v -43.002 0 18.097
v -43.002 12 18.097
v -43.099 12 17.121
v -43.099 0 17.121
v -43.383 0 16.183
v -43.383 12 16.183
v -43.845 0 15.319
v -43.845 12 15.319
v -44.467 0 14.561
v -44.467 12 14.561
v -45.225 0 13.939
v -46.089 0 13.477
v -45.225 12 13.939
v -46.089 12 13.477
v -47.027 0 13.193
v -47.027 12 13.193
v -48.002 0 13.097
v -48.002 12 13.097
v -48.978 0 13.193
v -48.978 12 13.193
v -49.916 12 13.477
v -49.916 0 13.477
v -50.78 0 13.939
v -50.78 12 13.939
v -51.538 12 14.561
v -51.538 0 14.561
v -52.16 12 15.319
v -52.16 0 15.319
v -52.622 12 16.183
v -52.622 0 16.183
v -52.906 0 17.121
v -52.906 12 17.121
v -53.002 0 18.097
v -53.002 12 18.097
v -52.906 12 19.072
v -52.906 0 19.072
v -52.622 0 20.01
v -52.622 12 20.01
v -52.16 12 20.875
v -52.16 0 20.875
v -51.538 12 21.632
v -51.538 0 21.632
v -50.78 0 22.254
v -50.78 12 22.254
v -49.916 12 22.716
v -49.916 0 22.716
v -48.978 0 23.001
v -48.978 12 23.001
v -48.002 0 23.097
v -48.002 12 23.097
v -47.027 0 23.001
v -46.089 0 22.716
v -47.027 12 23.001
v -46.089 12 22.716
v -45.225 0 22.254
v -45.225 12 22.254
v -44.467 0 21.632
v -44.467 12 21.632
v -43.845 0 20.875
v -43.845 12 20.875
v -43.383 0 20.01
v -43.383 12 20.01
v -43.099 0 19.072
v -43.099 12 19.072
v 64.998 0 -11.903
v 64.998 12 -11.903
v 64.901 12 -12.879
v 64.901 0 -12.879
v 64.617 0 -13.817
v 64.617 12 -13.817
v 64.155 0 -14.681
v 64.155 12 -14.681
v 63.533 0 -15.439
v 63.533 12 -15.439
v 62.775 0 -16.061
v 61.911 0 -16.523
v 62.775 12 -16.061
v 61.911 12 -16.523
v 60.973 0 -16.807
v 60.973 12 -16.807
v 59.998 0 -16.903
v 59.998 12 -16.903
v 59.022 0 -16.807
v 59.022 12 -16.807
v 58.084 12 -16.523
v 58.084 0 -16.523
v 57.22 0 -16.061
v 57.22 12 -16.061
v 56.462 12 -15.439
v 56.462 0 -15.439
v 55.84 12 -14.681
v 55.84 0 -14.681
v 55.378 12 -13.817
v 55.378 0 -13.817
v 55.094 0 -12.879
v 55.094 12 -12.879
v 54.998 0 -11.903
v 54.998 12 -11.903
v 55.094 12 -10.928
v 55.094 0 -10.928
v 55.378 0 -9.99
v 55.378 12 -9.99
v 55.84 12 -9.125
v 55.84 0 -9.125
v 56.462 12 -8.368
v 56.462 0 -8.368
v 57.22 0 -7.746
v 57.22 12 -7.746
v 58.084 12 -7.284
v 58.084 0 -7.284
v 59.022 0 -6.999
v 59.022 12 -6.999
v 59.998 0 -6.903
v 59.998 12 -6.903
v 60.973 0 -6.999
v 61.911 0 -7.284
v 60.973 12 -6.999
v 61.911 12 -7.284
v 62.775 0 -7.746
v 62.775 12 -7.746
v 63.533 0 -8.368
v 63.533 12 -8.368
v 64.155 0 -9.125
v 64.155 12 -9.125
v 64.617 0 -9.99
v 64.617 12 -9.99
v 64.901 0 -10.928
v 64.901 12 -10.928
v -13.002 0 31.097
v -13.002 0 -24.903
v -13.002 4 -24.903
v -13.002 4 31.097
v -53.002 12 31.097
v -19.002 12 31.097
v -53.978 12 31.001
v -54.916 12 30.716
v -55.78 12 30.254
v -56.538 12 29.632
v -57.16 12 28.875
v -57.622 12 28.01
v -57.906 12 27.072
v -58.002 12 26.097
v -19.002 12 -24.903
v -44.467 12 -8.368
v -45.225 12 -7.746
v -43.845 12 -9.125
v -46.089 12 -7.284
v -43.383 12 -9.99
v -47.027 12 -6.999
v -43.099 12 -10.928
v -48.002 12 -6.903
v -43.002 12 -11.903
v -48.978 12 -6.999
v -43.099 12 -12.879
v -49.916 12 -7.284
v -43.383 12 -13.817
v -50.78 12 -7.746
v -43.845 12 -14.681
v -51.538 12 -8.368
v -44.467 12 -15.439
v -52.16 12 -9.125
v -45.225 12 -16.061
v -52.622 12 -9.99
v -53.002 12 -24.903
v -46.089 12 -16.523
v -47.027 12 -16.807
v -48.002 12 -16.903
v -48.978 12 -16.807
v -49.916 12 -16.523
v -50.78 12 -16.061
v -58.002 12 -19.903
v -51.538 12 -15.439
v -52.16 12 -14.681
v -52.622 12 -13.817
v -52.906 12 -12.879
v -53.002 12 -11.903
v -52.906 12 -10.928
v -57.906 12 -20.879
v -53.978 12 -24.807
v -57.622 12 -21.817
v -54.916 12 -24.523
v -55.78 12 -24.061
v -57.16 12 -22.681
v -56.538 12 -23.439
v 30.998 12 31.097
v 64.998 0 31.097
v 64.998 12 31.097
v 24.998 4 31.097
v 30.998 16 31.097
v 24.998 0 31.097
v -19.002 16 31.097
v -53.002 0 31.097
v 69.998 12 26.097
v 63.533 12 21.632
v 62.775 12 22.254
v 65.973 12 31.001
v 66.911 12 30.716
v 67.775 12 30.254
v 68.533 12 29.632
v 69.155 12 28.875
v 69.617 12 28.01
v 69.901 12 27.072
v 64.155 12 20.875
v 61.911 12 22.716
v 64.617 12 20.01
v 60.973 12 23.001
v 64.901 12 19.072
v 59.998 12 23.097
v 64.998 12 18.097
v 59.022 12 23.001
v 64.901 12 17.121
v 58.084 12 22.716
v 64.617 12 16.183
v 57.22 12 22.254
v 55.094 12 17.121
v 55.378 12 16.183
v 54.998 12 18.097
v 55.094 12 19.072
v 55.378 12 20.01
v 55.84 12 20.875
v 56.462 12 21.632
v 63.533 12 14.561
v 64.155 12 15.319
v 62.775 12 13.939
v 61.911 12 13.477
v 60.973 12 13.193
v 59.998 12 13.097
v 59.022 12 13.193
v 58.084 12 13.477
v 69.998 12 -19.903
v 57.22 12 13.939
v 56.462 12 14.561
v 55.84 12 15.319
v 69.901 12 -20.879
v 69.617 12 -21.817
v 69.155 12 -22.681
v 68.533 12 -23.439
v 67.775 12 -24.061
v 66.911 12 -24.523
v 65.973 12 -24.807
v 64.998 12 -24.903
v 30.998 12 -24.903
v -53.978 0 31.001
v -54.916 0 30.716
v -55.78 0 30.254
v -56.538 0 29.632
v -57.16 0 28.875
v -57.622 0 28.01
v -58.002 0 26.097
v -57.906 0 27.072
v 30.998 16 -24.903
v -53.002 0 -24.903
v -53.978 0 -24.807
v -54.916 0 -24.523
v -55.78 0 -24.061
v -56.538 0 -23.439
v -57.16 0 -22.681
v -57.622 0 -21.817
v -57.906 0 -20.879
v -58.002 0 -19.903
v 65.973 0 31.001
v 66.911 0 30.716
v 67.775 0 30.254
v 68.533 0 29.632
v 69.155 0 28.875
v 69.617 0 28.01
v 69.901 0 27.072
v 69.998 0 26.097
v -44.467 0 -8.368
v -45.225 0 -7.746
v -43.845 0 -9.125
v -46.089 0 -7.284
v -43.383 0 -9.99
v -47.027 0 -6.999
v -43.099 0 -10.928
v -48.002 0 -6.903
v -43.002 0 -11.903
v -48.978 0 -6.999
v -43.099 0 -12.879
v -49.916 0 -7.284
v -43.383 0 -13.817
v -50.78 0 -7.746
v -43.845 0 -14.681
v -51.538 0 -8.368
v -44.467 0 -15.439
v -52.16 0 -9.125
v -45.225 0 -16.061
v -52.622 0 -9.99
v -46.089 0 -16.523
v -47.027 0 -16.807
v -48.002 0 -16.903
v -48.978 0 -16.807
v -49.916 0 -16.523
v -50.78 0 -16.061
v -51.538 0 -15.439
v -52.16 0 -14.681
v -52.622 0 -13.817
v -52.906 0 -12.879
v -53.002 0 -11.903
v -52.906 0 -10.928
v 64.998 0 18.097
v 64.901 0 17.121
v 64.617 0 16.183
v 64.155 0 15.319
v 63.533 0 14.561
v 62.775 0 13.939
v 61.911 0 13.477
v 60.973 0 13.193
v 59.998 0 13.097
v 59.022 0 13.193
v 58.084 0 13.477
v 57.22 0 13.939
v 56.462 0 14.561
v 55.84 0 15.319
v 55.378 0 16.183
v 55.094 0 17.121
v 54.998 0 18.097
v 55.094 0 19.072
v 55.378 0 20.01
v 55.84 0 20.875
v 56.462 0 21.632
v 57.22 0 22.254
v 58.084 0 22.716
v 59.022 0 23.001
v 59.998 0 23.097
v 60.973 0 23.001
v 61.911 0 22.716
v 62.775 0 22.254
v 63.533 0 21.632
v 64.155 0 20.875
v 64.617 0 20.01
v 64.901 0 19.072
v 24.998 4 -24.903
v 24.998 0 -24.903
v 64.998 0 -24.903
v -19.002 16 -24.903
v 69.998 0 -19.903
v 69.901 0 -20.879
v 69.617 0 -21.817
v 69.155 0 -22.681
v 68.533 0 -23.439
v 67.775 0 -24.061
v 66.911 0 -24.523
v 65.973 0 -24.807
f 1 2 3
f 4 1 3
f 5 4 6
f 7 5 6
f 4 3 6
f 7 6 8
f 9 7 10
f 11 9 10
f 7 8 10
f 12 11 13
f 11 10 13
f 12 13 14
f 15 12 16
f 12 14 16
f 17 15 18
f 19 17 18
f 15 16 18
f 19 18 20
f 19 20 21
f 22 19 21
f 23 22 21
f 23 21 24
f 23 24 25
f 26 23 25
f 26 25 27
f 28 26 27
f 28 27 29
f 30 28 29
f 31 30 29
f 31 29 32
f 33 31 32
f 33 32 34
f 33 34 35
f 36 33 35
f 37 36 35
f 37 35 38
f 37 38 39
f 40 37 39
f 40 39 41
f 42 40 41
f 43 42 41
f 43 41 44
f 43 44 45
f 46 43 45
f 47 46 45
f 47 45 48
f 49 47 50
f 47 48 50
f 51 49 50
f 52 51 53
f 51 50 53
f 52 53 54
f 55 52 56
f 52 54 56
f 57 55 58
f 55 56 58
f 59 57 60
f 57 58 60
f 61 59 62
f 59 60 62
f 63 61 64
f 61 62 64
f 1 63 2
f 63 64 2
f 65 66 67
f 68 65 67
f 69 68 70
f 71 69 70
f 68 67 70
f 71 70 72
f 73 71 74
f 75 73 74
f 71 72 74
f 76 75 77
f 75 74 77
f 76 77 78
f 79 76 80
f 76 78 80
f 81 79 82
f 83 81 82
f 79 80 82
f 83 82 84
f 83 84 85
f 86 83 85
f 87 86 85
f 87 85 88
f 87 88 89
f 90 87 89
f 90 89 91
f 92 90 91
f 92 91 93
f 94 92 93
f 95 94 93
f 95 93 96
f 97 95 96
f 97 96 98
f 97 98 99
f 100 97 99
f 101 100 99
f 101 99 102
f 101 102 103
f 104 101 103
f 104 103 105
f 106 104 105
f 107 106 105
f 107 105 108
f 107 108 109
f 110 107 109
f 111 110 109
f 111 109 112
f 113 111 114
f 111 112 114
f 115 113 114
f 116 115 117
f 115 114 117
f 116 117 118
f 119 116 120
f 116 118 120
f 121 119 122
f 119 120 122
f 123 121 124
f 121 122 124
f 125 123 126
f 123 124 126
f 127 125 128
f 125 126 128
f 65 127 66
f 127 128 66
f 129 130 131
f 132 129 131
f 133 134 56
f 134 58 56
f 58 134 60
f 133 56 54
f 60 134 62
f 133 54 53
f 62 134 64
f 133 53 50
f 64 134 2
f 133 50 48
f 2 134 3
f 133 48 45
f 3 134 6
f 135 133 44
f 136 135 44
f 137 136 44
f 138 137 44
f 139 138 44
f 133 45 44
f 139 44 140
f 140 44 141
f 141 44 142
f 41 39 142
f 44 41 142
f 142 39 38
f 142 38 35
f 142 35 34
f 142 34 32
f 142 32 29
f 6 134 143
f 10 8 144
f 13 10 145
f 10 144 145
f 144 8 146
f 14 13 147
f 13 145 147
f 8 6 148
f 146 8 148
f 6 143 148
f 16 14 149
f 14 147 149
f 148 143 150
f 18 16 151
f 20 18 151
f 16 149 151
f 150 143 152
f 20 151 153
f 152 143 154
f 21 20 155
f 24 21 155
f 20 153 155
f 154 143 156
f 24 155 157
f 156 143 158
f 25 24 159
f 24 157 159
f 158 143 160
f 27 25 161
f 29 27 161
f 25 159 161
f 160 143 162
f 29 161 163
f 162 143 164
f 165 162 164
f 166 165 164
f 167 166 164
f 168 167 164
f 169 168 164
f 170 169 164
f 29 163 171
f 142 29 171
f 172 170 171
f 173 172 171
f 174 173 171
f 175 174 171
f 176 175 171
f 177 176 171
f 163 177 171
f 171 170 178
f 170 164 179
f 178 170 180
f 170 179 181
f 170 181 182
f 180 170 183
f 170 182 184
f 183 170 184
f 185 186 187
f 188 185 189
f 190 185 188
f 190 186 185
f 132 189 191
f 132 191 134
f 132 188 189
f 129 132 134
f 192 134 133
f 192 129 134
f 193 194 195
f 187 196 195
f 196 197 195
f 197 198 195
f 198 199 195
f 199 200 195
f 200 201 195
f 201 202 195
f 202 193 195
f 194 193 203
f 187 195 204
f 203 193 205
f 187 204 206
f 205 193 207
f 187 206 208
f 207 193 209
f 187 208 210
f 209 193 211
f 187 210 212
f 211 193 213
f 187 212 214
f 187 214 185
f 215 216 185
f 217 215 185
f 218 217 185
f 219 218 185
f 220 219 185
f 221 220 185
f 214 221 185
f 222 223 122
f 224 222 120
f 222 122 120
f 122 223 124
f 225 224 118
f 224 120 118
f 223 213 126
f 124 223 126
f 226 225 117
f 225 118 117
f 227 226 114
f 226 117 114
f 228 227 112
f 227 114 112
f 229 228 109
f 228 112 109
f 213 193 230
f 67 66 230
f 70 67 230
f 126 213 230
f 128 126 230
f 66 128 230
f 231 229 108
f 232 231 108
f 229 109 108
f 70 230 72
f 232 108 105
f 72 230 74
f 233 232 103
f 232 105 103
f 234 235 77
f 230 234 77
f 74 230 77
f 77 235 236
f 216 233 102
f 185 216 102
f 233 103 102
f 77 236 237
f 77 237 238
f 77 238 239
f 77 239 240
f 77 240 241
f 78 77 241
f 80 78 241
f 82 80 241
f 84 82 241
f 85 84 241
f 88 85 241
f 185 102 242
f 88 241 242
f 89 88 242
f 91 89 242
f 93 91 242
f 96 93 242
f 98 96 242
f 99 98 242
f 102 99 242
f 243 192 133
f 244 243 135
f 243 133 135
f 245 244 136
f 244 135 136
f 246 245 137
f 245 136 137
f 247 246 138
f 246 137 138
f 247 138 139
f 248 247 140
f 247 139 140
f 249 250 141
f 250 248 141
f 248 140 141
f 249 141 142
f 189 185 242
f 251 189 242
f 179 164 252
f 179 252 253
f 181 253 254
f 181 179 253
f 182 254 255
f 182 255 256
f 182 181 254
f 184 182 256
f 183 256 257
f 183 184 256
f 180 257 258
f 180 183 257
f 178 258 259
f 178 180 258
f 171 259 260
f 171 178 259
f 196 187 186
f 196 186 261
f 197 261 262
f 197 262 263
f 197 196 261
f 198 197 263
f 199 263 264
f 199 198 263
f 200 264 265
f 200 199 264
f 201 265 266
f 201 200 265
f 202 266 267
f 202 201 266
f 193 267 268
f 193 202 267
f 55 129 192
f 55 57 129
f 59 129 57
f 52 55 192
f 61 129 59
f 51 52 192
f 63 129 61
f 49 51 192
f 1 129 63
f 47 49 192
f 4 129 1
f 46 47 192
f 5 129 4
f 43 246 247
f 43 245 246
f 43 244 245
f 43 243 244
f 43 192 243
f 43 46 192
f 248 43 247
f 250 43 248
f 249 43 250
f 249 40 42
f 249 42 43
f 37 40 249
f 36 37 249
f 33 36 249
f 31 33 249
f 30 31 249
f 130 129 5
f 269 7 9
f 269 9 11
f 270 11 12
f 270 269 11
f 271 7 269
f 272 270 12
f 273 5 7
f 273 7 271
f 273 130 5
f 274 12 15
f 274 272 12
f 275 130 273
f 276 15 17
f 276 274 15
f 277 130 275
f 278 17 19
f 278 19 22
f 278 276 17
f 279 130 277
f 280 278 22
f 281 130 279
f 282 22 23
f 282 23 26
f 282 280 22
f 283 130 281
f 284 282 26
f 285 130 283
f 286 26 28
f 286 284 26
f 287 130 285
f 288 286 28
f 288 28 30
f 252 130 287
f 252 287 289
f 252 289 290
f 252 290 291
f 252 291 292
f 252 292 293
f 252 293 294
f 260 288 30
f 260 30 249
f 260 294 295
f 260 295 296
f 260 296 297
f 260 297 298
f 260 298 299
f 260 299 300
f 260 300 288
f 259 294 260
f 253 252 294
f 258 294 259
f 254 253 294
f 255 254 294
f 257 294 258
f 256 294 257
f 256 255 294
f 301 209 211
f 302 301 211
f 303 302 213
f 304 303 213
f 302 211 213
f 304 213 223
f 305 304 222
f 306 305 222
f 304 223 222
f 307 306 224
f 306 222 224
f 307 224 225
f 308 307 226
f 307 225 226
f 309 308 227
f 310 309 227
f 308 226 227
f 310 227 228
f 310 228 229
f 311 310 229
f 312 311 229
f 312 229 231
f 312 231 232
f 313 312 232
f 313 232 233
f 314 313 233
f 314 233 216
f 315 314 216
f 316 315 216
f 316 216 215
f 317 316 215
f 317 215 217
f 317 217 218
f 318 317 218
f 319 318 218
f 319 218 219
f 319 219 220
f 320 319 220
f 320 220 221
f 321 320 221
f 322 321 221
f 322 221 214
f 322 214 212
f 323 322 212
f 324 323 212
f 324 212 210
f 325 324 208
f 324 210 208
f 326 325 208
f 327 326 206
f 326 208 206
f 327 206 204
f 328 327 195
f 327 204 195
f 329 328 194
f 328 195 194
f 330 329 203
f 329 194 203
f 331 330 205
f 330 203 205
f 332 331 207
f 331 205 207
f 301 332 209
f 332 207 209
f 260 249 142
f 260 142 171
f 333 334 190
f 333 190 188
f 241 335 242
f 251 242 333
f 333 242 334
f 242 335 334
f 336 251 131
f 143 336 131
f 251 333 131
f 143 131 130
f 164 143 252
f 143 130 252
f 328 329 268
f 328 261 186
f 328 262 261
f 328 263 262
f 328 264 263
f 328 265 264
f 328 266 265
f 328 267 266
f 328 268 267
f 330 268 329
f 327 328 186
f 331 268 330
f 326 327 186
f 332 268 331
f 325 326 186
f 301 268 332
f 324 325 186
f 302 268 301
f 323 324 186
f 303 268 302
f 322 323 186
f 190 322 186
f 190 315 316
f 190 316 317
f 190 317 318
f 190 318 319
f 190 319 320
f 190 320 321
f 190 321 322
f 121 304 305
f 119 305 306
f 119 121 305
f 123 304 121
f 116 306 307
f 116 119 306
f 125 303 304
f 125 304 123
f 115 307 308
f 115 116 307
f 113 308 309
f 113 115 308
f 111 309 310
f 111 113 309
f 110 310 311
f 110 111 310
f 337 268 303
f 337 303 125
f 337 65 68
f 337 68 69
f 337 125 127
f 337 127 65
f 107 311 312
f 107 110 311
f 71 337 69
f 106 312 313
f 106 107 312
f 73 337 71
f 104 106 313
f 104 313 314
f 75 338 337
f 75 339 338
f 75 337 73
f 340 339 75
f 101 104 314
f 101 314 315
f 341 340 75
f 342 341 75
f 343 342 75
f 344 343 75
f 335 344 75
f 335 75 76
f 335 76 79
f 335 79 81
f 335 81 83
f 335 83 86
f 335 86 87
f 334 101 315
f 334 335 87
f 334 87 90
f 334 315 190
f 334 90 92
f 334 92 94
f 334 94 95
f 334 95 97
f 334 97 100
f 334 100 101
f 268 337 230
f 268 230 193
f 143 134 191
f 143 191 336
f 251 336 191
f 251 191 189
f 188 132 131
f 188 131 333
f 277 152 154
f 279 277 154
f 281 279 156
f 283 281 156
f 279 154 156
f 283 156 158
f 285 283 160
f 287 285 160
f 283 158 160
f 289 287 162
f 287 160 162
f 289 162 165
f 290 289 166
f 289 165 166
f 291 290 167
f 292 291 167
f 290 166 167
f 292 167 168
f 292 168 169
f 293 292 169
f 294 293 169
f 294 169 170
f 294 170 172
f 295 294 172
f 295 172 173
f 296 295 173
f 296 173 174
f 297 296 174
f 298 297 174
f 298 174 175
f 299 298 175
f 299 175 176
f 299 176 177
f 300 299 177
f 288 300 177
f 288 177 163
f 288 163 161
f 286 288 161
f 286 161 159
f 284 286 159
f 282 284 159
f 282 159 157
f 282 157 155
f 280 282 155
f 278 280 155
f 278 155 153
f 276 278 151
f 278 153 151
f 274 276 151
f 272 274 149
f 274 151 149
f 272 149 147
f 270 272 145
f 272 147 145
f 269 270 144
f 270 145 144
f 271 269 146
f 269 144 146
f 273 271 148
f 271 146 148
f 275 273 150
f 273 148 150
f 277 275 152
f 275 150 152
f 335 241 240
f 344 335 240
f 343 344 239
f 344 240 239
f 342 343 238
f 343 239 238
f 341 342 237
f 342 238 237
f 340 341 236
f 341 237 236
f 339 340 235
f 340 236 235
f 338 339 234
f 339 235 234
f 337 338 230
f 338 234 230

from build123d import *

# Parameters (mm, degrees)
Y_KSEKLIK_EKSTR_ZYON1_DEPTH = 12
IZIM2_W                     = 50
IZIM2_H                     = 56
Y_KSEKLIK_EKSTR_ZYON2_DEPTH = 4
IZIM3_W                     = 38
IZIM3_H                     = 4
KES_EKSTR_ZYON1_DEPTH       = 56
IZIM4_R                     = 5
KES_EKSTR_ZYON2_DEPTH       = 56
KES_EKSTR_ZYON3_DEPTH       = 56


with BuildPart() as part:
    # Çizim1 → Yükseklik-Ekstrüzyon1 (new body)
    with BuildSketch(Plane(origin=(0, 0, 0), x_dir=(1, 0, 0), z_dir=(0, 1, 0))):
        Polygon((69.99751861, 24.903225806), (69.99751861, -31.096774194), (-58.00248139, -31.096774194), (-58.00248139, 24.903225806), (-19.00248139, 24.903225806), (30.99751861, 24.903225806), align=None)
    extrude(amount=Y_KSEKLIK_EKSTR_ZYON1_DEPTH)

    # Çizim2 → Yükseklik-Ekstrüzyon2 (add)
    with BuildSketch(Plane(origin=(0, 12, 0), x_dir=(1, 0, 0), z_dir=(0, 1, 0))):
        with Locations((5.99751861, -3.096774194)):
            Rectangle(IZIM2_W, IZIM2_H)
    extrude(amount=Y_KSEKLIK_EKSTR_ZYON2_DEPTH)

    # Çizim3 → Kes-Ekstrüzyon1 (cut)
    with BuildSketch(Plane.XY.offset(31.096774194)):
        with Locations((5.99751861, 2)):
            Rectangle(IZIM3_W, IZIM3_H)
    extrude(amount=-KES_EKSTR_ZYON1_DEPTH, mode=Mode.SUBTRACT)

    # Çizim4 → Kes-Ekstrüzyon2 (cut)
    with BuildSketch(Plane(origin=(0, 12, 0), x_dir=(1, 0, 0), z_dir=(0, 1, 0))):
        with Locations((-48.00248139, 11.903225806)):
            Circle(IZIM4_R)
        with Locations((-48.00248139, -18.096774194)):
            Circle(IZIM4_R)
        with Locations((59.99751861, -18.096774194)):
            Circle(IZIM4_R)
        with Locations((59.99751861, 11.903225806)):
            Circle(IZIM4_R)
    extrude(amount=-KES_EKSTR_ZYON2_DEPTH, mode=Mode.SUBTRACT)

    # Çizim5 → Kes-Ekstrüzyon3 (cut)
    with BuildSketch(Plane(origin=(0, 12, 0), x_dir=(1, 0, 0), z_dir=(0, 1, 0))):
        with BuildLine():
            Line((-58.00248139, 19.903225806), (-58.00248139, 24.903225806))
            Line((-58.00248139, 24.903225806), (-53.00248139, 24.903225806))
            ThreePointArc((-53.00248139, 24.903225806), (-56.538015296, 23.438759712), (-58.00248139, 19.903225806))
        make_face()
        with BuildLine():
            Line((69.99751861, -26.096774194), (69.99751861, -31.096774194))
            Line((69.99751861, -31.096774194), (64.99751861, -31.096774194))
            ThreePointArc((64.99751861, -31.096774194), (68.533052516, -29.632308099), (69.99751861, -26.096774194))
        make_face()
        with BuildLine():
            Line((-58.00248139, -31.096774194), (-53.00248139, -31.096774194))
            ThreePointArc((-53.00248139, -31.096774194), (-56.538015296, -29.632308099), (-58.00248139, -26.096774194))
            Line((-58.00248139, -26.096774194), (-58.00248139, -31.096774194))
        make_face()
        with BuildLine():
            Line((69.99751861, 24.903225806), (64.99751861, 24.903225806))
            ThreePointArc((64.99751861, 24.903225806), (68.533052516, 23.438759712), (69.99751861, 19.903225806))
            Line((69.99751861, 19.903225806), (69.99751861, 24.903225806))
        make_face()
    extrude(amount=-KES_EKSTR_ZYON3_DEPTH, mode=Mode.SUBTRACT)


solid = part.part
